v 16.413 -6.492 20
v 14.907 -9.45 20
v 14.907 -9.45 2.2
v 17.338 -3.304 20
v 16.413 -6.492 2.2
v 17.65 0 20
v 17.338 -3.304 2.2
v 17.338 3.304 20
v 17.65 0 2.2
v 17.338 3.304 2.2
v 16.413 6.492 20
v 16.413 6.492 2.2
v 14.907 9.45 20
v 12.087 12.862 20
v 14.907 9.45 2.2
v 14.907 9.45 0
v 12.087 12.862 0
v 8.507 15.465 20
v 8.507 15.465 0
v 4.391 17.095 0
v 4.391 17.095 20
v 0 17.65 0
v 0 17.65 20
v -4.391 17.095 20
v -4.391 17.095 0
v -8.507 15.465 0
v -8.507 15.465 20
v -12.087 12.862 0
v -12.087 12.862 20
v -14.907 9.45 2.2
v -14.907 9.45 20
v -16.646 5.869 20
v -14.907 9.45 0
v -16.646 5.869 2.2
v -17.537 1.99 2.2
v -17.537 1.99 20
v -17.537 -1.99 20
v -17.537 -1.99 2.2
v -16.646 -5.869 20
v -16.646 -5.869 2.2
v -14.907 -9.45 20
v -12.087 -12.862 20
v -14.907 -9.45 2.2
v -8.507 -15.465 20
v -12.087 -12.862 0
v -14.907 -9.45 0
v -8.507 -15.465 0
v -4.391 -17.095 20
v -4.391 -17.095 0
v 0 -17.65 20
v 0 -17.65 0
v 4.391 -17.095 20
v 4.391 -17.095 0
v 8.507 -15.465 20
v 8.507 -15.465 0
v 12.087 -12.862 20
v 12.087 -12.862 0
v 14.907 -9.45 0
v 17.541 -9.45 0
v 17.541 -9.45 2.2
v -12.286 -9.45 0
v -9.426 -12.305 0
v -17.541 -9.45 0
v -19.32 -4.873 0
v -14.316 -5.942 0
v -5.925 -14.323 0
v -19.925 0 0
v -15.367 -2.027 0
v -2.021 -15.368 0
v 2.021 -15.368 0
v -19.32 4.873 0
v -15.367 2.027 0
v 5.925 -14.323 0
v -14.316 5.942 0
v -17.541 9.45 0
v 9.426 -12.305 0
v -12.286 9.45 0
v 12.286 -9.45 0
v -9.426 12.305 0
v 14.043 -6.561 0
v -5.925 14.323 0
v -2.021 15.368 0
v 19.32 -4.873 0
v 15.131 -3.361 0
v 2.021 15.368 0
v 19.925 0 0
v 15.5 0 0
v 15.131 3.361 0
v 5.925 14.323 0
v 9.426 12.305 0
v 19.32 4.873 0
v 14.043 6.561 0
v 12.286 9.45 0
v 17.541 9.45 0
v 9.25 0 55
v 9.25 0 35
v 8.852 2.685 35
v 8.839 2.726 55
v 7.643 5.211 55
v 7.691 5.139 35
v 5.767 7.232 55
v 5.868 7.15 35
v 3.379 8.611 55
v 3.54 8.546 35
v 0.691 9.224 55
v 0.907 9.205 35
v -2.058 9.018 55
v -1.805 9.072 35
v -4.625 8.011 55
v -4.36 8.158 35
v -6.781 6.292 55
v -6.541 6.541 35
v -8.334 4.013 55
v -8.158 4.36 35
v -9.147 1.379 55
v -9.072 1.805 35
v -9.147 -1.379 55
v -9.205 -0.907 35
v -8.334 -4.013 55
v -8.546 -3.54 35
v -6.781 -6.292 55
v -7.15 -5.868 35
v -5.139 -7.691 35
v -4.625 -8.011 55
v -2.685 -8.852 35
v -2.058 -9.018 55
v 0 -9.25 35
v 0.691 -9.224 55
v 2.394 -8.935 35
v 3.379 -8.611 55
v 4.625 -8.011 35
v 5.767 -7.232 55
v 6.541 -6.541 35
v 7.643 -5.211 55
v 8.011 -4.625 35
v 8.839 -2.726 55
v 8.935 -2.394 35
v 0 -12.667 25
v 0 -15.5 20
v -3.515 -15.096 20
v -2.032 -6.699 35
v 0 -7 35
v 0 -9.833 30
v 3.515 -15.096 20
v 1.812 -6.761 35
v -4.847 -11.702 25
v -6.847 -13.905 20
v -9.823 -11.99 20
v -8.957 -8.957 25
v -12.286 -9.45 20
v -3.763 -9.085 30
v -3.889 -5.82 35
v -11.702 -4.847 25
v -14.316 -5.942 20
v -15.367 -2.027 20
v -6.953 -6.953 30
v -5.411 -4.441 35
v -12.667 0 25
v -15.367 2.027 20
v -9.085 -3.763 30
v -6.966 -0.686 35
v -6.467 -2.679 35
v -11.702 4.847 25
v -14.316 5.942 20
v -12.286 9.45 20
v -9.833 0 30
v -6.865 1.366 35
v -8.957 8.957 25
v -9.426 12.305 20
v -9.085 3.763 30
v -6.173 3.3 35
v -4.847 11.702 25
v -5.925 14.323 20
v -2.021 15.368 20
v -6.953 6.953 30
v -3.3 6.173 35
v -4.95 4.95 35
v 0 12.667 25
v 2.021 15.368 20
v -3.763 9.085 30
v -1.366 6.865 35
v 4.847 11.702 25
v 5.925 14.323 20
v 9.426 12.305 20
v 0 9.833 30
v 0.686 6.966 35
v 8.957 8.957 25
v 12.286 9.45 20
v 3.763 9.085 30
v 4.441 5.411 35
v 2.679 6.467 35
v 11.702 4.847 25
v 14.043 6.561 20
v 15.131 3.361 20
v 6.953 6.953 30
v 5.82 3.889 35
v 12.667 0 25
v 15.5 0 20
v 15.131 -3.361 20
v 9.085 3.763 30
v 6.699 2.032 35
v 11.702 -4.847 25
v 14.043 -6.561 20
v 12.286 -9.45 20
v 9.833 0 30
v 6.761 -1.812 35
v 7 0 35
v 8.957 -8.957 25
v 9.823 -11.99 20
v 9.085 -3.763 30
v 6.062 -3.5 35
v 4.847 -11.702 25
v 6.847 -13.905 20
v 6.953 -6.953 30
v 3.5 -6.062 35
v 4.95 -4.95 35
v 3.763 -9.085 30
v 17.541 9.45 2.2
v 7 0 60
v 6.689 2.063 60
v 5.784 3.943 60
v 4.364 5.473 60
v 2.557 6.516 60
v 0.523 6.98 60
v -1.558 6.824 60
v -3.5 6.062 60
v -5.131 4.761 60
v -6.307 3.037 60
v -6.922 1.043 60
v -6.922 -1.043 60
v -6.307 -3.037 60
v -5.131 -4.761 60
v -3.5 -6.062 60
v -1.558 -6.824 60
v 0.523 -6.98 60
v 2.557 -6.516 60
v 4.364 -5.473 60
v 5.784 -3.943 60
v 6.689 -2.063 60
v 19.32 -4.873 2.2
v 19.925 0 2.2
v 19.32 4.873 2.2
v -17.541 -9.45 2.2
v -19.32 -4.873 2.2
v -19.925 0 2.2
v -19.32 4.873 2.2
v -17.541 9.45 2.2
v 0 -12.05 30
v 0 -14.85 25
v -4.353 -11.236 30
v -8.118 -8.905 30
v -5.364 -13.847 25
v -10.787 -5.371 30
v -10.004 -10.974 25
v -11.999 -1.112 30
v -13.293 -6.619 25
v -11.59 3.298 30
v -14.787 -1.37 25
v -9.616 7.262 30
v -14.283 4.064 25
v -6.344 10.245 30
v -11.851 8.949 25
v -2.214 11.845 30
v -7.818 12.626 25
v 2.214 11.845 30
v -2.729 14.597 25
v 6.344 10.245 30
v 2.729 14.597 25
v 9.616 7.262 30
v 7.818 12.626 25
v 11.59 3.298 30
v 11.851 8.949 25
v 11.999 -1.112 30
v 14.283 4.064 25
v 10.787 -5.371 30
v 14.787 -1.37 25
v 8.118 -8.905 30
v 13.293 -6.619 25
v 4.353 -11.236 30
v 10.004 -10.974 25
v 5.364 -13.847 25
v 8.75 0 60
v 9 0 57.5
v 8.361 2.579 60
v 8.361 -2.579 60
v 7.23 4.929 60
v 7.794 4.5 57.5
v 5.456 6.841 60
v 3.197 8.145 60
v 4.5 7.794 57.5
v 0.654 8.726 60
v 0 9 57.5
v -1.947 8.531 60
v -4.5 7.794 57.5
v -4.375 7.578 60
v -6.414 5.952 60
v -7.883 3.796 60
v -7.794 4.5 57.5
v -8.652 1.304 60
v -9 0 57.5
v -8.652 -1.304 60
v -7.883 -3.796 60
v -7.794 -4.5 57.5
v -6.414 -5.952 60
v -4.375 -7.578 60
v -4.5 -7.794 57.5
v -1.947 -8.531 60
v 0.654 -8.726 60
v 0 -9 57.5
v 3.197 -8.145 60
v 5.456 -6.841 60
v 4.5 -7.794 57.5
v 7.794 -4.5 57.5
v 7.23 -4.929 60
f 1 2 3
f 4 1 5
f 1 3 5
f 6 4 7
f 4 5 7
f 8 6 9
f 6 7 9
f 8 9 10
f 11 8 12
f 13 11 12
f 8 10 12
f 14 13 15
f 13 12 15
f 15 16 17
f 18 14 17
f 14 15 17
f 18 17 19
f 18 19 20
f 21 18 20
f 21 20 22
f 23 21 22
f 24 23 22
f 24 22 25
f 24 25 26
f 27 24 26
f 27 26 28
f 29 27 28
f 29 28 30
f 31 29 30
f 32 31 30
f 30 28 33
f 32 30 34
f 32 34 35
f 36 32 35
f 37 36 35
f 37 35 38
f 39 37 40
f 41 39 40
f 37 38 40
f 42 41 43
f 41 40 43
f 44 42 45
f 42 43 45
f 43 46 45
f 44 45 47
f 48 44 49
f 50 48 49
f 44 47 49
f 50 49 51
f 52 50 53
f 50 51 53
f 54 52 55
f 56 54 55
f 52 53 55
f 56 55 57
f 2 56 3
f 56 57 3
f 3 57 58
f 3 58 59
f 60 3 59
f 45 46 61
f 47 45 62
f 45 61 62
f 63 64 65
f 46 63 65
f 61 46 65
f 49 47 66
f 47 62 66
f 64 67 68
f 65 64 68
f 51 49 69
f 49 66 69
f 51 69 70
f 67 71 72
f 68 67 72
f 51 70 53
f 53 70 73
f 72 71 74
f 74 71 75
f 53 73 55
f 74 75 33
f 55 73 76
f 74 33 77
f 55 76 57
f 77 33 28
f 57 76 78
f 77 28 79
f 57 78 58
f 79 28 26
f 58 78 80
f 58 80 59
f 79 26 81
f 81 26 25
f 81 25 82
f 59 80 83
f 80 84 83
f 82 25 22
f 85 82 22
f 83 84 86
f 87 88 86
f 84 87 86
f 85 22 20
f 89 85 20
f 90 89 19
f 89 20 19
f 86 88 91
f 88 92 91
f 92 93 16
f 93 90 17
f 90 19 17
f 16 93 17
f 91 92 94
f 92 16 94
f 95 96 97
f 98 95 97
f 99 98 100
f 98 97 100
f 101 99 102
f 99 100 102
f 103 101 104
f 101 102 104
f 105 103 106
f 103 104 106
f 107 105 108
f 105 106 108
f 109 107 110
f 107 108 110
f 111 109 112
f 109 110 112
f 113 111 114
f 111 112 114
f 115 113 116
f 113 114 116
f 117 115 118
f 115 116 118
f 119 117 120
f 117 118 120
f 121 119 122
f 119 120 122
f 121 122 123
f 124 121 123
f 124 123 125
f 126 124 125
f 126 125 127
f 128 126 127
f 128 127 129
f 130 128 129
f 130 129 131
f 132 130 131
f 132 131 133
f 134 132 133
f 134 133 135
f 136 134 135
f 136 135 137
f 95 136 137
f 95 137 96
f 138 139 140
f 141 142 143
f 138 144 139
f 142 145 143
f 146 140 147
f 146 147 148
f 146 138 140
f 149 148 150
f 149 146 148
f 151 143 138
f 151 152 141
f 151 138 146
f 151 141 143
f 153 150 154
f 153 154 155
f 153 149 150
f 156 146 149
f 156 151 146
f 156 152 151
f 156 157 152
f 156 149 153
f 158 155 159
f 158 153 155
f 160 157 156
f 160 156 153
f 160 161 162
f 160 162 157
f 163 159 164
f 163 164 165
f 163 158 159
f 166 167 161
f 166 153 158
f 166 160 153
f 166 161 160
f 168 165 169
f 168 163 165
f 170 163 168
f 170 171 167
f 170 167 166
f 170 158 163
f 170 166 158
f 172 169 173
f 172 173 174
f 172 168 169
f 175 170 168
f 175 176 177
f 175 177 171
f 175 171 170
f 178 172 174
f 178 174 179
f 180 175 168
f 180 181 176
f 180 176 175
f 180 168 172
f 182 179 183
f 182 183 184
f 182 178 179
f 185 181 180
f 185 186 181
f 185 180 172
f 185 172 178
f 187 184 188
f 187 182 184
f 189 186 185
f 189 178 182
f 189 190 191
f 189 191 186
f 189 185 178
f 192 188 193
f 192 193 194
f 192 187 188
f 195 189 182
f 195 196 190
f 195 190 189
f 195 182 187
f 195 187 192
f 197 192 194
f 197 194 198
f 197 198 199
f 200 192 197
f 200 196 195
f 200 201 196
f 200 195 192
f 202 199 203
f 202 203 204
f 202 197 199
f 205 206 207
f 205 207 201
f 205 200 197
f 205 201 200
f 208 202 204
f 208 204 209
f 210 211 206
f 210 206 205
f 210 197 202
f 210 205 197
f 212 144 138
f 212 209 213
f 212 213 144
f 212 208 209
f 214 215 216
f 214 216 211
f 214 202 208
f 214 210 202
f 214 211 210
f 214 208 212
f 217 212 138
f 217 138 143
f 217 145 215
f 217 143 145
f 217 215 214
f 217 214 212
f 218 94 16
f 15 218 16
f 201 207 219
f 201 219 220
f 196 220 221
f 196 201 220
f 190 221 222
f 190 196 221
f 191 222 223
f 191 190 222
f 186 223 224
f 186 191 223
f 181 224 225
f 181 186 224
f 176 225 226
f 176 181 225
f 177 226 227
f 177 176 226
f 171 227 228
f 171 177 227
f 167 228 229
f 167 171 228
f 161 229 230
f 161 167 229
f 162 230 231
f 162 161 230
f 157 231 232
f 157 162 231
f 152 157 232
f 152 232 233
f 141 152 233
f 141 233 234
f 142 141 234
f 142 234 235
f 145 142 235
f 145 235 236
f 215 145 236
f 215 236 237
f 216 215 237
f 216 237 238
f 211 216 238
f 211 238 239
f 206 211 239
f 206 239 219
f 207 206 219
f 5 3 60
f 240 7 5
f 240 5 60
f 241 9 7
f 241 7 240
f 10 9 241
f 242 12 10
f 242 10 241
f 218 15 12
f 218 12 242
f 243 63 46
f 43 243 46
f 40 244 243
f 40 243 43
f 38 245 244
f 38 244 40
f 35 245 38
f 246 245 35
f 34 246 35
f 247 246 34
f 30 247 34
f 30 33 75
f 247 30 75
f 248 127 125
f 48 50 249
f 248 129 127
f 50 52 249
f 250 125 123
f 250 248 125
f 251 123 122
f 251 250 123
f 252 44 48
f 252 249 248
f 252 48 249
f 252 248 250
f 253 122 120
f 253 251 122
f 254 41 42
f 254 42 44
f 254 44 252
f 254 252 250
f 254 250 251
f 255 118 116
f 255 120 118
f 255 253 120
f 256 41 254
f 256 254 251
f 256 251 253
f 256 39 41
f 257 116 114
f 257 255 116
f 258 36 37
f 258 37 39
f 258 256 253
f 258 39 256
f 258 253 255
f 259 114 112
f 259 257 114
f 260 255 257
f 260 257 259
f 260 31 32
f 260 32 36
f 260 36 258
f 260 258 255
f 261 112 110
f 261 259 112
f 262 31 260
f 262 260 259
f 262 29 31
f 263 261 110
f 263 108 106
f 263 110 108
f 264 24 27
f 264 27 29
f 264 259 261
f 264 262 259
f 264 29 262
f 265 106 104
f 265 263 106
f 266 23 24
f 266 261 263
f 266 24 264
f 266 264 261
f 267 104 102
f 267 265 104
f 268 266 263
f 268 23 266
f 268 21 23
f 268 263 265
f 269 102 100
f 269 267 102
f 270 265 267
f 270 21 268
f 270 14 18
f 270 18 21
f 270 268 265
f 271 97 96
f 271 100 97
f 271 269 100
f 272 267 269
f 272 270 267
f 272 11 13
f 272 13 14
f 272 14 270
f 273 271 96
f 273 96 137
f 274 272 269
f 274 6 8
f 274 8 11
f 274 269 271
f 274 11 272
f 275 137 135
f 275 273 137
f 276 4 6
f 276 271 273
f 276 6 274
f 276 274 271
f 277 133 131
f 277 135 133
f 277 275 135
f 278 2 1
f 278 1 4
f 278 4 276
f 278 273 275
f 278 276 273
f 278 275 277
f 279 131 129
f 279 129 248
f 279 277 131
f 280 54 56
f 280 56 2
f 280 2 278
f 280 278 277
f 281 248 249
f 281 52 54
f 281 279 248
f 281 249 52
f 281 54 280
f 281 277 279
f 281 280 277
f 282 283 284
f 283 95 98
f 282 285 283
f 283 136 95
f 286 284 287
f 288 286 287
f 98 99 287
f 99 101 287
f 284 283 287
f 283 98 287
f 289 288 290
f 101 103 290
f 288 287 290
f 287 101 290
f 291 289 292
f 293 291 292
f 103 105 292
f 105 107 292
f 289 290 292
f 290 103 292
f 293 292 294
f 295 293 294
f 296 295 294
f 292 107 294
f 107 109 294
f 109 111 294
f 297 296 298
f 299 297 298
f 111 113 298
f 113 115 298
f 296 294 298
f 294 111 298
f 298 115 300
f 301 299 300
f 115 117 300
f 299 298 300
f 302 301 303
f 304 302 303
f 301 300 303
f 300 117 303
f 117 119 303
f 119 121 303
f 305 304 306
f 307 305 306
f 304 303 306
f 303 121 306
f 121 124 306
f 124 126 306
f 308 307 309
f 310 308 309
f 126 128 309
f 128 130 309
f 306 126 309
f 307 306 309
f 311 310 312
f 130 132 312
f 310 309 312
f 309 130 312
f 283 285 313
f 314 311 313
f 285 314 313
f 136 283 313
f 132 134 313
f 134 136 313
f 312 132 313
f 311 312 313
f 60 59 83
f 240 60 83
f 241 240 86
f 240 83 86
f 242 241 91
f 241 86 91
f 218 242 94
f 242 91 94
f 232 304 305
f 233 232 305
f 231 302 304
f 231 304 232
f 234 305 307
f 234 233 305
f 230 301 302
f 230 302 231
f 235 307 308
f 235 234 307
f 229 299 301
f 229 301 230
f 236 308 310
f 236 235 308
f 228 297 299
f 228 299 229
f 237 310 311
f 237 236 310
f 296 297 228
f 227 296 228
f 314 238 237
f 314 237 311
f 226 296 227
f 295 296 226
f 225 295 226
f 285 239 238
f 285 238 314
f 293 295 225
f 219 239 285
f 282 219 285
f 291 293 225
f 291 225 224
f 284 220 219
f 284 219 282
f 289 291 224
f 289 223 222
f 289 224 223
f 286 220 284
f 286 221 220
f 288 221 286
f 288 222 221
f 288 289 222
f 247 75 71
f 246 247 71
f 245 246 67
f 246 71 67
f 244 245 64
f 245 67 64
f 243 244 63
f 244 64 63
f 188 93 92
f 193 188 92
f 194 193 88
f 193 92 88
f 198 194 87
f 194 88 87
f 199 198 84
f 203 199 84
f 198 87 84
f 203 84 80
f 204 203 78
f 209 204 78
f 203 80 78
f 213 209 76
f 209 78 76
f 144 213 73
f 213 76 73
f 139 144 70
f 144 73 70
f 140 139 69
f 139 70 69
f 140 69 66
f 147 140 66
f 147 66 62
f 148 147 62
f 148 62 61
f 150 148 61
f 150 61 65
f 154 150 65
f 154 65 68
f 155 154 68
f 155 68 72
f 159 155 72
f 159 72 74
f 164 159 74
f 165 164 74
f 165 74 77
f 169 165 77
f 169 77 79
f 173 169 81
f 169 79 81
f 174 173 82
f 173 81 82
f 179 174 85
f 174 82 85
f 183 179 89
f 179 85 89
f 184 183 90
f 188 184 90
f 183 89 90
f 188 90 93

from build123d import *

# Parameters (mm, degrees)
F1_DEPTH = 2.2
F2_DEPTH = 20
F4_R     = 9.25
F4_R_2   = 7
F5_DEPTH = 25
F8_SIZE2 = 5
F8_SIZE  = 0.5


with BuildPart() as f1:
    # F0 (on Top) → F1 (new body)
    with BuildSketch(Plane.XY):
        with BuildLine():
            ThreePointArc((-14.9070453142, -9.45), (-17.65, 0), (-14.9070453142, 9.45))
            Line((-14.9070453142, 9.45), (-17.5414687241, 9.45))
            ThreePointArc((-17.5414687241, 9.45), (-19.925, 0), (-17.5414687241, -9.45))
            Line((-17.5414687241, -9.45), (-14.9070453142, -9.45))
        make_face()
        with BuildLine():
            ThreePointArc((14.9070453142, 9.45), (16.9503960101, 4.9200177949), (17.65, 0))
            ThreePointArc((17.65, 0), (16.9503960101, -4.9200177949), (14.9070453142, -9.45))
            Line((14.9070453142, -9.45), (17.5414687241, -9.45))
            ThreePointArc((17.5414687241, -9.45), (19.925, 0), (17.5414687241, 9.45))
            Line((17.5414687241, 9.45), (14.9070453142, 9.45))
        make_face()
        with BuildLine():
            Line((12.286069347, 9.45), (14.9070453142, 9.45))
            ThreePointArc((14.9070453142, 9.45), (0, 17.65), (-14.9070453142, 9.45))
            Line((-14.9070453142, 9.45), (-12.286069347, 9.45))
            ThreePointArc((-12.286069347, 9.45), (0, 15.5), (12.286069347, 9.45))
        make_face()
        with BuildLine():
            Line((-12.286069347, 9.45), (-14.9070453142, 9.45))
            ThreePointArc((-14.9070453142, 9.45), (-17.65, 0), (-14.9070453142, -9.45))
            Line((-14.9070453142, -9.45), (-12.286069347, -9.45))
            ThreePointArc((-12.286069347, -9.45), (-15.5, 0), (-12.286069347, 9.45))
        make_face()
        with BuildLine():
            ThreePointArc((-14.9070453142, -9.45), (0, -17.65), (14.9070453142, -9.45))
            Line((14.9070453142, -9.45), (12.286069347, -9.45))
            ThreePointArc((12.286069347, -9.45), (0, -15.5), (-12.286069347, -9.45))
            Line((-12.286069347, -9.45), (-14.9070453142, -9.45))
        make_face()
        with BuildLine():
            ThreePointArc((14.9070453142, -9.45), (16.9503960101, -4.9200177949), (17.65, 0))
            ThreePointArc((17.65, 0), (16.9503960101, 4.9200177949), (14.9070453142, 9.45))
            Line((14.9070453142, 9.45), (12.286069347, 9.45))
            ThreePointArc((12.286069347, 9.45), (14.6745370434, 4.9907877695), (15.5, 0))
            ThreePointArc((15.5, 0), (14.6745370434, -4.9907877695), (12.286069347, -9.45))
            Line((12.286069347, -9.45), (14.9070453142, -9.45))
        make_face()
    extrude(amount=F1_DEPTH)

    # F0 (on Top) → F2 (join)
    with BuildSketch(Plane.XY):
        with BuildLine():
            Line((12.286069347, 9.45), (14.9070453142, 9.45))
            ThreePointArc((14.9070453142, 9.45), (0, 17.65), (-14.9070453142, 9.45))
            Line((-14.9070453142, 9.45), (-12.286069347, 9.45))
            ThreePointArc((-12.286069347, 9.45), (0, 15.5), (12.286069347, 9.45))
        make_face()
        with BuildLine():
            Line((-12.286069347, 9.45), (-14.9070453142, 9.45))
            ThreePointArc((-14.9070453142, 9.45), (-17.65, 0), (-14.9070453142, -9.45))
            Line((-14.9070453142, -9.45), (-12.286069347, -9.45))
            ThreePointArc((-12.286069347, -9.45), (-15.5, 0), (-12.286069347, 9.45))
        make_face()
        with BuildLine():
            ThreePointArc((-14.9070453142, -9.45), (0, -17.65), (14.9070453142, -9.45))
            Line((14.9070453142, -9.45), (12.286069347, -9.45))
            ThreePointArc((12.286069347, -9.45), (0, -15.5), (-12.286069347, -9.45))
            Line((-12.286069347, -9.45), (-14.9070453142, -9.45))
        make_face()
        with BuildLine():
            ThreePointArc((14.9070453142, -9.45), (16.9503960101, -4.9200177949), (17.65, 0))
            ThreePointArc((17.65, 0), (16.9503960101, 4.9200177949), (14.9070453142, 9.45))
            Line((14.9070453142, 9.45), (12.286069347, 9.45))
            ThreePointArc((12.286069347, 9.45), (14.6745370434, 4.9907877695), (15.5, 0))
            ThreePointArc((15.5, 0), (14.6745370434, -4.9907877695), (12.286069347, -9.45))
            Line((12.286069347, -9.45), (14.9070453142, -9.45))
        make_face()
    extrude(amount=F2_DEPTH)



with BuildPart() as f5:
    # F4 (on offset) → F5 (new body)
    with BuildSketch(Plane.XY.offset(35)):
        Circle(F4_R)
        Circle(F4_R_2, mode=Mode.SUBTRACT)
    extrude(amount=F5_DEPTH)


with BuildPart() as f1_1:
    add(f1.part)

    add(f5.part)  # F7 merges F5
    # F6 (on Right) → F7 (revolve)
    with BuildSketch(Plane.YZ):
        Polygon((-9.25, 35), (-17.65, 20), (-15.5, 20), (-7, 35), align=None)
    revolve(axis=Axis((0, 0, 18.8534432091), (0, 0, -1)))

    # F8
    f8_edges = [f1_1.edges().sort_by_distance(p)[0] for p in [
        (-9.25, 0, 60),
    ]]
    f8_side = f1_1.faces().sort_by_distance((-8.98837, 0, 60))[0]
    chamfer(f8_edges, length=F8_SIZE, length2=F8_SIZE2, reference=f8_side)


solid = f1_1.part
